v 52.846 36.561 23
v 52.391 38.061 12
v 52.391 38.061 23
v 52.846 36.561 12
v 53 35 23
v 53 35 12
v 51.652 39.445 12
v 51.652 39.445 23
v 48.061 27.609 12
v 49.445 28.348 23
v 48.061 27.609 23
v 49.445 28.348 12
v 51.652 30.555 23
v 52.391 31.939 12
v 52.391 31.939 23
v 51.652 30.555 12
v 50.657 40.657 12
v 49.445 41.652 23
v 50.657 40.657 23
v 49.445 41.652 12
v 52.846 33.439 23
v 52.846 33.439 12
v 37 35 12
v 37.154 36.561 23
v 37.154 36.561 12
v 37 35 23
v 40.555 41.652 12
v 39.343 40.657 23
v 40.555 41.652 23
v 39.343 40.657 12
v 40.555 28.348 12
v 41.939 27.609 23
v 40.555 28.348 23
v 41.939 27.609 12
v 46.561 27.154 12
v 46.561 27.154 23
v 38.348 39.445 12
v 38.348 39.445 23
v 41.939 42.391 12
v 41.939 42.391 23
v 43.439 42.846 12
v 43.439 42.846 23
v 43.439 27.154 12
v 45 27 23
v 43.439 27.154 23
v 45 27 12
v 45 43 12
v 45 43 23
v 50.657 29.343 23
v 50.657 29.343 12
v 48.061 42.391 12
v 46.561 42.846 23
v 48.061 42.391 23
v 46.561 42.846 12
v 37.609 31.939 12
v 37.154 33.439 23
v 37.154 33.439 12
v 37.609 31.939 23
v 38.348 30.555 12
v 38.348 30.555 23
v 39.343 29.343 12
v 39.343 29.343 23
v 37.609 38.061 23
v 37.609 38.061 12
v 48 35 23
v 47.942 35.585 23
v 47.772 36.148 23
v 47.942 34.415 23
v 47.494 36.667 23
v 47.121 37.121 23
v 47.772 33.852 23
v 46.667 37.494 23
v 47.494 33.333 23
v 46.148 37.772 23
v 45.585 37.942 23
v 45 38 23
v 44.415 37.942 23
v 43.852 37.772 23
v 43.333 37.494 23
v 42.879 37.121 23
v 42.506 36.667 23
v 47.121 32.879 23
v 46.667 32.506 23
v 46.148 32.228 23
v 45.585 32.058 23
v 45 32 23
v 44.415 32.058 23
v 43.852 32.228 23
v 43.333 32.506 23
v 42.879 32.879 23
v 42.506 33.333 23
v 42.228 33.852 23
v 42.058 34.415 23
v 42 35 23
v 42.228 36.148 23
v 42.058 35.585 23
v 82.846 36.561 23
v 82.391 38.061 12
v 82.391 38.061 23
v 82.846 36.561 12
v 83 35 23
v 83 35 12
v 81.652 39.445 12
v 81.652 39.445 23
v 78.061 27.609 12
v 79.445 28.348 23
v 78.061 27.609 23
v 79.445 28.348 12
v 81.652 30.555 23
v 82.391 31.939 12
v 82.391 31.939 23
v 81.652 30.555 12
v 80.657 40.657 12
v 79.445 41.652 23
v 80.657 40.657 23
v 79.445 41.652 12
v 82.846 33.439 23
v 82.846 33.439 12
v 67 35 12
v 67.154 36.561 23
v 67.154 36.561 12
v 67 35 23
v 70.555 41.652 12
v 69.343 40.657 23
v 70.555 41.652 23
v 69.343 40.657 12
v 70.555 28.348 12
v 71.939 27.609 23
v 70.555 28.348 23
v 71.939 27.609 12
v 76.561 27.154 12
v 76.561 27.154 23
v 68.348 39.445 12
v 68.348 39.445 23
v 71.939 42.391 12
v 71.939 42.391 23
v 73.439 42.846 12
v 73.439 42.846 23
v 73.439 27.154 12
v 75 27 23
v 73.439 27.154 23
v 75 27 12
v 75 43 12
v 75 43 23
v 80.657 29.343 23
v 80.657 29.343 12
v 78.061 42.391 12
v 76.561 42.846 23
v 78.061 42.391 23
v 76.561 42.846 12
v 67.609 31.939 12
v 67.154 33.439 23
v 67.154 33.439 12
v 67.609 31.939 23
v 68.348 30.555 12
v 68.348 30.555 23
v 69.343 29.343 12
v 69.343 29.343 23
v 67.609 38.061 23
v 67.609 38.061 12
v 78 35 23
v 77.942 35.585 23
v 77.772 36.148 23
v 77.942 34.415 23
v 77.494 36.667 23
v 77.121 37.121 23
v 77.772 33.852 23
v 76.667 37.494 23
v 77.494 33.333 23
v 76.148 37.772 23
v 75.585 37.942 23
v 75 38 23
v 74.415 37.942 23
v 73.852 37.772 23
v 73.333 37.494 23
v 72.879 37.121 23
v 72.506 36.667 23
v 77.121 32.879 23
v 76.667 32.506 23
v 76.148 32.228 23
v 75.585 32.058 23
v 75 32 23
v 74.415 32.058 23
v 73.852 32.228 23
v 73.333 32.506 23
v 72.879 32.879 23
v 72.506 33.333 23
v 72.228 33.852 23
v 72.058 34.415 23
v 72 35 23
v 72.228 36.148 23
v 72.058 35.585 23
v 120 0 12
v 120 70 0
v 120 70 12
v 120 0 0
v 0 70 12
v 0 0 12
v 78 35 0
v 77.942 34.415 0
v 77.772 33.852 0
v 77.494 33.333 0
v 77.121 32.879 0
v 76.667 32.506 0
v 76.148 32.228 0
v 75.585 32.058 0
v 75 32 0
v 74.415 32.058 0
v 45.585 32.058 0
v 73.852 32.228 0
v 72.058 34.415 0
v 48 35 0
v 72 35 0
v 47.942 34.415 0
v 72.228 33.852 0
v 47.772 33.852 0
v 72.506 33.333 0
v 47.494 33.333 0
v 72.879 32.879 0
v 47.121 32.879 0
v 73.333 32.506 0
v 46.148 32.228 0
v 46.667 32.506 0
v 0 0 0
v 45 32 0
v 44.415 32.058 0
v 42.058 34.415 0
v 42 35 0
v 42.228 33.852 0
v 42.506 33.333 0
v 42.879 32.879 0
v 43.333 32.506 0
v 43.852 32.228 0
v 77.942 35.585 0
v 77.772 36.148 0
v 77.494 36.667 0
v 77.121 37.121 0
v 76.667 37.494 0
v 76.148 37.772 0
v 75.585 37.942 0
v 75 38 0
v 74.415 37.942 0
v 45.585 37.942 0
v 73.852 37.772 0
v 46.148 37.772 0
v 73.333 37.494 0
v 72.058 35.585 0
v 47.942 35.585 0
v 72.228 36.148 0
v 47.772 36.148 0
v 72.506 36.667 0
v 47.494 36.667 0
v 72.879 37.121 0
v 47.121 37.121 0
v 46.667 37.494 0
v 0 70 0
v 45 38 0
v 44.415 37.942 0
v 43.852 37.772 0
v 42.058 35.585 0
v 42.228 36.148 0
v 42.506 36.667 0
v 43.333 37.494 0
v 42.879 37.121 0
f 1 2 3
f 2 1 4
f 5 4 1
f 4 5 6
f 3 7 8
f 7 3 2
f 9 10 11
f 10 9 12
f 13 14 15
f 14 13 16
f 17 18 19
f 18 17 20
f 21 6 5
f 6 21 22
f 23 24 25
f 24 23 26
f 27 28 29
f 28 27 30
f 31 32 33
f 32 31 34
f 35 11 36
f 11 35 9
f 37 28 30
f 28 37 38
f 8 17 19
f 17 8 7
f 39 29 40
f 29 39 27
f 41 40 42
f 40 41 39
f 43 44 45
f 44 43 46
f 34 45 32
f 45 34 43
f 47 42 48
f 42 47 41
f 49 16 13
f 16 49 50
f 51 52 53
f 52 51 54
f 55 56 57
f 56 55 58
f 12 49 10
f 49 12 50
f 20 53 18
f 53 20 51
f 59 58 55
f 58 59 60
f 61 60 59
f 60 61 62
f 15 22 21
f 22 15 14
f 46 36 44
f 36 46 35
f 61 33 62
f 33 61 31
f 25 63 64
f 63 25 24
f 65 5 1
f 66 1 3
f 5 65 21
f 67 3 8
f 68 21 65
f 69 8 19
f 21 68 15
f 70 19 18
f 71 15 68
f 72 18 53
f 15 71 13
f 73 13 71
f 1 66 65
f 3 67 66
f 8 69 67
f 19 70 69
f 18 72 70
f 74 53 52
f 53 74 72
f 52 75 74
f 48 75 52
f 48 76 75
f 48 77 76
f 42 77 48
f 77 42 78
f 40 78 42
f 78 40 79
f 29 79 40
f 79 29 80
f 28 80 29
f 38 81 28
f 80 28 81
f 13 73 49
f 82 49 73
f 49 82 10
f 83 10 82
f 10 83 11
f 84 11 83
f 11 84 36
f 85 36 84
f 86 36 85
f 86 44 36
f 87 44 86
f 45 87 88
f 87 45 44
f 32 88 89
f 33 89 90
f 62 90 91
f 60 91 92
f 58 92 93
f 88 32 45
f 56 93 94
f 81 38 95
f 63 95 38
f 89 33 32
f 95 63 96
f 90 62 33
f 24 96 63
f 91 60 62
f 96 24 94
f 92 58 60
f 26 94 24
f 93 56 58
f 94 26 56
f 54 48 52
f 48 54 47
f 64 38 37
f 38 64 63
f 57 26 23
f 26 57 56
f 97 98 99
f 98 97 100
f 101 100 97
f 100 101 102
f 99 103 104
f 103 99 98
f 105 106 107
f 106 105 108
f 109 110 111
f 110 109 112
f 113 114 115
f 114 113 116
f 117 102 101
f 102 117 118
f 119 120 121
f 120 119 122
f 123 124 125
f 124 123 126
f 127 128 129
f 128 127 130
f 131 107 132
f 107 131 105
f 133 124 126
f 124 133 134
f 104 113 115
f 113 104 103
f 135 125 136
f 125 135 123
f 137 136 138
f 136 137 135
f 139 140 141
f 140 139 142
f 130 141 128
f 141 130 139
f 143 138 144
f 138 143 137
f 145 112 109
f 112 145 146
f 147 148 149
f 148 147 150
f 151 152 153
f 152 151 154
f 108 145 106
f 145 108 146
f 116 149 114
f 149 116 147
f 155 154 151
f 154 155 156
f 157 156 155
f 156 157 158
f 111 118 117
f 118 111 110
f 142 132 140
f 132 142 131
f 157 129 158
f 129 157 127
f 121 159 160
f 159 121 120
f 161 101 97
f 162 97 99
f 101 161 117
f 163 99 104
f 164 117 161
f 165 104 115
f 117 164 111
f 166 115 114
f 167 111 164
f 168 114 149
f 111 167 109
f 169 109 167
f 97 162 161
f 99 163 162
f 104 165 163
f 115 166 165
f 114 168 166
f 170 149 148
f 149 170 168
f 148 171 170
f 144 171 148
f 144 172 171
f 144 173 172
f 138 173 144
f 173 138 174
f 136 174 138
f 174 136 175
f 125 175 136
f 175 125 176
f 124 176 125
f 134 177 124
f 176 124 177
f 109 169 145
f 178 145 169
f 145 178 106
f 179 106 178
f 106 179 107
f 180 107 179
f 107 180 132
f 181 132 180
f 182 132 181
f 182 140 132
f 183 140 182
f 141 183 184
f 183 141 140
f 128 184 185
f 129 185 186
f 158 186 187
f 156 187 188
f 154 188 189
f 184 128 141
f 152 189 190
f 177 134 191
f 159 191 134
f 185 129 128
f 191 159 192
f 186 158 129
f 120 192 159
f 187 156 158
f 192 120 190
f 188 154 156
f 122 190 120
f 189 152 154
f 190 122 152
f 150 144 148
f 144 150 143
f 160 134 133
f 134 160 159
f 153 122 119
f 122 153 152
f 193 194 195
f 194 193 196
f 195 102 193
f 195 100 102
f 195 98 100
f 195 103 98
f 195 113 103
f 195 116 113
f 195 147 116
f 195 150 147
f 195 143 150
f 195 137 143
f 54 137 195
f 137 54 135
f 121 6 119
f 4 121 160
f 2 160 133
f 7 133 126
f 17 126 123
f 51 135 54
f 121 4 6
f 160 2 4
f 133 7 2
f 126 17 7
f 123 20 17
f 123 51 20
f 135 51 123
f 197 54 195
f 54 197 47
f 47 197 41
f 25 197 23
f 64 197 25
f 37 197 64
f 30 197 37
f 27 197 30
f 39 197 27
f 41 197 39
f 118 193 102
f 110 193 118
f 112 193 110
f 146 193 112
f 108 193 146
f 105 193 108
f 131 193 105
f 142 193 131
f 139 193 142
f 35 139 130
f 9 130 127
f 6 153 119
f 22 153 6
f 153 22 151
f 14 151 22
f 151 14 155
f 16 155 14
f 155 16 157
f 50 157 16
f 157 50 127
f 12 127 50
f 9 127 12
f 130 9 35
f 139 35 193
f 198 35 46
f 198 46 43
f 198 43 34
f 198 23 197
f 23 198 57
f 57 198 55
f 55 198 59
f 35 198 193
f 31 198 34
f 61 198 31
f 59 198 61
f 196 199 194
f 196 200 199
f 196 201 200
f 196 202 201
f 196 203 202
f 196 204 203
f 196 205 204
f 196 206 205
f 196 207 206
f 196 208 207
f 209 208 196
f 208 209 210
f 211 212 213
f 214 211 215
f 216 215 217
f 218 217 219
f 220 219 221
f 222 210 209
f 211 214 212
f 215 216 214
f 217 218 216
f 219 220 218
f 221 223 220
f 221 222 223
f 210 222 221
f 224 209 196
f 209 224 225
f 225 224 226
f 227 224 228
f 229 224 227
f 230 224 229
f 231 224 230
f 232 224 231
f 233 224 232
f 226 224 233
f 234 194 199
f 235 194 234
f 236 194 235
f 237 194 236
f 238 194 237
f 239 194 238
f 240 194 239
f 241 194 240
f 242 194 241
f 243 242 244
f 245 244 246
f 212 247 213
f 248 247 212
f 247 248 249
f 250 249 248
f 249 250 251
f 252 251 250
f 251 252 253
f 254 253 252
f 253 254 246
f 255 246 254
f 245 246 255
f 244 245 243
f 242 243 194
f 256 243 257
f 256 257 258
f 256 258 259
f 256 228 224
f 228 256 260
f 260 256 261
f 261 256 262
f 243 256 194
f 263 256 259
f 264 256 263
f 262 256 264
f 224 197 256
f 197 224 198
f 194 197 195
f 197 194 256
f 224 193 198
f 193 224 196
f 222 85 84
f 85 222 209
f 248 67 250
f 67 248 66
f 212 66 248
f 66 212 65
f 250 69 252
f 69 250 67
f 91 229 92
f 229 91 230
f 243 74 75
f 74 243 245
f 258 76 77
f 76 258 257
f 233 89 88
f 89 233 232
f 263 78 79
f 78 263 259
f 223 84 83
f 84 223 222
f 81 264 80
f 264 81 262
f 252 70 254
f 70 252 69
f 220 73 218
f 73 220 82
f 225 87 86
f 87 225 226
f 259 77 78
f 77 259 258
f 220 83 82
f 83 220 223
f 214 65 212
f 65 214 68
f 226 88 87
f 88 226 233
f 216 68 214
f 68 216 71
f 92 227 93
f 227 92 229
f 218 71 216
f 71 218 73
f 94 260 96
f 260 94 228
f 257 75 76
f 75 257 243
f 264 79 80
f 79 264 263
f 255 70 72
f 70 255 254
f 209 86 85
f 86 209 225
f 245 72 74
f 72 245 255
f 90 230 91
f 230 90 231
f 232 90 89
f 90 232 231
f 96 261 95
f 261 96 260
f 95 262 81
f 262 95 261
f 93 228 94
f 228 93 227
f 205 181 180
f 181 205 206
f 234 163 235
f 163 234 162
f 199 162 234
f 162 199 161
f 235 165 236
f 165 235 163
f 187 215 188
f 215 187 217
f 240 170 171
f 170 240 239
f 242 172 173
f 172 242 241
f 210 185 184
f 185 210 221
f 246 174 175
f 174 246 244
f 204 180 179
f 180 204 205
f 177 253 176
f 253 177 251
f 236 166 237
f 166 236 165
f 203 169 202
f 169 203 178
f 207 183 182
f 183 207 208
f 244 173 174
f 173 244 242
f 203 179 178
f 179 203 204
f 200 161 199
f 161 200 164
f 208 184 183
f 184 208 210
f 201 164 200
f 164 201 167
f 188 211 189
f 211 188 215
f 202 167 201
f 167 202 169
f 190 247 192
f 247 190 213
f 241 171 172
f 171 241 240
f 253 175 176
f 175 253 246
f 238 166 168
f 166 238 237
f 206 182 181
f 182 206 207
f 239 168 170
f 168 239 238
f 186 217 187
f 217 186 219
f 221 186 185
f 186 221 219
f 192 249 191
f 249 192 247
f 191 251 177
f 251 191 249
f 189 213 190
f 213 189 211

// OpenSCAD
$fn = 32;

// ----------------------------------------------------------------------
// Drill jig: two_boss jig
// ----------------------------------------------------------------------

// --- parameters (mm) ---
plate_l = 120;            // plate length, X
plate_w = 70;             // plate width, Y
plate_t = 12;             // plate thickness
boss_d = 16;              // guide boss diameter
boss_h = 12;              // boss height above the plate
guide_d = 6;              // guide hole diameter
boss_pitch = 30;          // boss pitch

n_boss = 2;  // guide bosses
boss_x0 = (plate_l - (n_boss - 1) * boss_pitch) / 2;  // first boss X
boss_top = plate_t - 1 + boss_h;  // boss crown height
total_h = boss_top;  // overall height

difference() {
  union() {
  cube([plate_l, plate_w, plate_t]);
  for (i = [0 : n_boss - 1])
    translate([boss_x0 + i * boss_pitch, plate_w / 2, plate_t - 1])
      cylinder(h = boss_h, d = boss_d);
  }
  for (i = [0 : n_boss - 1])
    translate([boss_x0 + i * boss_pitch, plate_w / 2, -1])
      cylinder(h = plate_t + boss_h, d = guide_d);
}
